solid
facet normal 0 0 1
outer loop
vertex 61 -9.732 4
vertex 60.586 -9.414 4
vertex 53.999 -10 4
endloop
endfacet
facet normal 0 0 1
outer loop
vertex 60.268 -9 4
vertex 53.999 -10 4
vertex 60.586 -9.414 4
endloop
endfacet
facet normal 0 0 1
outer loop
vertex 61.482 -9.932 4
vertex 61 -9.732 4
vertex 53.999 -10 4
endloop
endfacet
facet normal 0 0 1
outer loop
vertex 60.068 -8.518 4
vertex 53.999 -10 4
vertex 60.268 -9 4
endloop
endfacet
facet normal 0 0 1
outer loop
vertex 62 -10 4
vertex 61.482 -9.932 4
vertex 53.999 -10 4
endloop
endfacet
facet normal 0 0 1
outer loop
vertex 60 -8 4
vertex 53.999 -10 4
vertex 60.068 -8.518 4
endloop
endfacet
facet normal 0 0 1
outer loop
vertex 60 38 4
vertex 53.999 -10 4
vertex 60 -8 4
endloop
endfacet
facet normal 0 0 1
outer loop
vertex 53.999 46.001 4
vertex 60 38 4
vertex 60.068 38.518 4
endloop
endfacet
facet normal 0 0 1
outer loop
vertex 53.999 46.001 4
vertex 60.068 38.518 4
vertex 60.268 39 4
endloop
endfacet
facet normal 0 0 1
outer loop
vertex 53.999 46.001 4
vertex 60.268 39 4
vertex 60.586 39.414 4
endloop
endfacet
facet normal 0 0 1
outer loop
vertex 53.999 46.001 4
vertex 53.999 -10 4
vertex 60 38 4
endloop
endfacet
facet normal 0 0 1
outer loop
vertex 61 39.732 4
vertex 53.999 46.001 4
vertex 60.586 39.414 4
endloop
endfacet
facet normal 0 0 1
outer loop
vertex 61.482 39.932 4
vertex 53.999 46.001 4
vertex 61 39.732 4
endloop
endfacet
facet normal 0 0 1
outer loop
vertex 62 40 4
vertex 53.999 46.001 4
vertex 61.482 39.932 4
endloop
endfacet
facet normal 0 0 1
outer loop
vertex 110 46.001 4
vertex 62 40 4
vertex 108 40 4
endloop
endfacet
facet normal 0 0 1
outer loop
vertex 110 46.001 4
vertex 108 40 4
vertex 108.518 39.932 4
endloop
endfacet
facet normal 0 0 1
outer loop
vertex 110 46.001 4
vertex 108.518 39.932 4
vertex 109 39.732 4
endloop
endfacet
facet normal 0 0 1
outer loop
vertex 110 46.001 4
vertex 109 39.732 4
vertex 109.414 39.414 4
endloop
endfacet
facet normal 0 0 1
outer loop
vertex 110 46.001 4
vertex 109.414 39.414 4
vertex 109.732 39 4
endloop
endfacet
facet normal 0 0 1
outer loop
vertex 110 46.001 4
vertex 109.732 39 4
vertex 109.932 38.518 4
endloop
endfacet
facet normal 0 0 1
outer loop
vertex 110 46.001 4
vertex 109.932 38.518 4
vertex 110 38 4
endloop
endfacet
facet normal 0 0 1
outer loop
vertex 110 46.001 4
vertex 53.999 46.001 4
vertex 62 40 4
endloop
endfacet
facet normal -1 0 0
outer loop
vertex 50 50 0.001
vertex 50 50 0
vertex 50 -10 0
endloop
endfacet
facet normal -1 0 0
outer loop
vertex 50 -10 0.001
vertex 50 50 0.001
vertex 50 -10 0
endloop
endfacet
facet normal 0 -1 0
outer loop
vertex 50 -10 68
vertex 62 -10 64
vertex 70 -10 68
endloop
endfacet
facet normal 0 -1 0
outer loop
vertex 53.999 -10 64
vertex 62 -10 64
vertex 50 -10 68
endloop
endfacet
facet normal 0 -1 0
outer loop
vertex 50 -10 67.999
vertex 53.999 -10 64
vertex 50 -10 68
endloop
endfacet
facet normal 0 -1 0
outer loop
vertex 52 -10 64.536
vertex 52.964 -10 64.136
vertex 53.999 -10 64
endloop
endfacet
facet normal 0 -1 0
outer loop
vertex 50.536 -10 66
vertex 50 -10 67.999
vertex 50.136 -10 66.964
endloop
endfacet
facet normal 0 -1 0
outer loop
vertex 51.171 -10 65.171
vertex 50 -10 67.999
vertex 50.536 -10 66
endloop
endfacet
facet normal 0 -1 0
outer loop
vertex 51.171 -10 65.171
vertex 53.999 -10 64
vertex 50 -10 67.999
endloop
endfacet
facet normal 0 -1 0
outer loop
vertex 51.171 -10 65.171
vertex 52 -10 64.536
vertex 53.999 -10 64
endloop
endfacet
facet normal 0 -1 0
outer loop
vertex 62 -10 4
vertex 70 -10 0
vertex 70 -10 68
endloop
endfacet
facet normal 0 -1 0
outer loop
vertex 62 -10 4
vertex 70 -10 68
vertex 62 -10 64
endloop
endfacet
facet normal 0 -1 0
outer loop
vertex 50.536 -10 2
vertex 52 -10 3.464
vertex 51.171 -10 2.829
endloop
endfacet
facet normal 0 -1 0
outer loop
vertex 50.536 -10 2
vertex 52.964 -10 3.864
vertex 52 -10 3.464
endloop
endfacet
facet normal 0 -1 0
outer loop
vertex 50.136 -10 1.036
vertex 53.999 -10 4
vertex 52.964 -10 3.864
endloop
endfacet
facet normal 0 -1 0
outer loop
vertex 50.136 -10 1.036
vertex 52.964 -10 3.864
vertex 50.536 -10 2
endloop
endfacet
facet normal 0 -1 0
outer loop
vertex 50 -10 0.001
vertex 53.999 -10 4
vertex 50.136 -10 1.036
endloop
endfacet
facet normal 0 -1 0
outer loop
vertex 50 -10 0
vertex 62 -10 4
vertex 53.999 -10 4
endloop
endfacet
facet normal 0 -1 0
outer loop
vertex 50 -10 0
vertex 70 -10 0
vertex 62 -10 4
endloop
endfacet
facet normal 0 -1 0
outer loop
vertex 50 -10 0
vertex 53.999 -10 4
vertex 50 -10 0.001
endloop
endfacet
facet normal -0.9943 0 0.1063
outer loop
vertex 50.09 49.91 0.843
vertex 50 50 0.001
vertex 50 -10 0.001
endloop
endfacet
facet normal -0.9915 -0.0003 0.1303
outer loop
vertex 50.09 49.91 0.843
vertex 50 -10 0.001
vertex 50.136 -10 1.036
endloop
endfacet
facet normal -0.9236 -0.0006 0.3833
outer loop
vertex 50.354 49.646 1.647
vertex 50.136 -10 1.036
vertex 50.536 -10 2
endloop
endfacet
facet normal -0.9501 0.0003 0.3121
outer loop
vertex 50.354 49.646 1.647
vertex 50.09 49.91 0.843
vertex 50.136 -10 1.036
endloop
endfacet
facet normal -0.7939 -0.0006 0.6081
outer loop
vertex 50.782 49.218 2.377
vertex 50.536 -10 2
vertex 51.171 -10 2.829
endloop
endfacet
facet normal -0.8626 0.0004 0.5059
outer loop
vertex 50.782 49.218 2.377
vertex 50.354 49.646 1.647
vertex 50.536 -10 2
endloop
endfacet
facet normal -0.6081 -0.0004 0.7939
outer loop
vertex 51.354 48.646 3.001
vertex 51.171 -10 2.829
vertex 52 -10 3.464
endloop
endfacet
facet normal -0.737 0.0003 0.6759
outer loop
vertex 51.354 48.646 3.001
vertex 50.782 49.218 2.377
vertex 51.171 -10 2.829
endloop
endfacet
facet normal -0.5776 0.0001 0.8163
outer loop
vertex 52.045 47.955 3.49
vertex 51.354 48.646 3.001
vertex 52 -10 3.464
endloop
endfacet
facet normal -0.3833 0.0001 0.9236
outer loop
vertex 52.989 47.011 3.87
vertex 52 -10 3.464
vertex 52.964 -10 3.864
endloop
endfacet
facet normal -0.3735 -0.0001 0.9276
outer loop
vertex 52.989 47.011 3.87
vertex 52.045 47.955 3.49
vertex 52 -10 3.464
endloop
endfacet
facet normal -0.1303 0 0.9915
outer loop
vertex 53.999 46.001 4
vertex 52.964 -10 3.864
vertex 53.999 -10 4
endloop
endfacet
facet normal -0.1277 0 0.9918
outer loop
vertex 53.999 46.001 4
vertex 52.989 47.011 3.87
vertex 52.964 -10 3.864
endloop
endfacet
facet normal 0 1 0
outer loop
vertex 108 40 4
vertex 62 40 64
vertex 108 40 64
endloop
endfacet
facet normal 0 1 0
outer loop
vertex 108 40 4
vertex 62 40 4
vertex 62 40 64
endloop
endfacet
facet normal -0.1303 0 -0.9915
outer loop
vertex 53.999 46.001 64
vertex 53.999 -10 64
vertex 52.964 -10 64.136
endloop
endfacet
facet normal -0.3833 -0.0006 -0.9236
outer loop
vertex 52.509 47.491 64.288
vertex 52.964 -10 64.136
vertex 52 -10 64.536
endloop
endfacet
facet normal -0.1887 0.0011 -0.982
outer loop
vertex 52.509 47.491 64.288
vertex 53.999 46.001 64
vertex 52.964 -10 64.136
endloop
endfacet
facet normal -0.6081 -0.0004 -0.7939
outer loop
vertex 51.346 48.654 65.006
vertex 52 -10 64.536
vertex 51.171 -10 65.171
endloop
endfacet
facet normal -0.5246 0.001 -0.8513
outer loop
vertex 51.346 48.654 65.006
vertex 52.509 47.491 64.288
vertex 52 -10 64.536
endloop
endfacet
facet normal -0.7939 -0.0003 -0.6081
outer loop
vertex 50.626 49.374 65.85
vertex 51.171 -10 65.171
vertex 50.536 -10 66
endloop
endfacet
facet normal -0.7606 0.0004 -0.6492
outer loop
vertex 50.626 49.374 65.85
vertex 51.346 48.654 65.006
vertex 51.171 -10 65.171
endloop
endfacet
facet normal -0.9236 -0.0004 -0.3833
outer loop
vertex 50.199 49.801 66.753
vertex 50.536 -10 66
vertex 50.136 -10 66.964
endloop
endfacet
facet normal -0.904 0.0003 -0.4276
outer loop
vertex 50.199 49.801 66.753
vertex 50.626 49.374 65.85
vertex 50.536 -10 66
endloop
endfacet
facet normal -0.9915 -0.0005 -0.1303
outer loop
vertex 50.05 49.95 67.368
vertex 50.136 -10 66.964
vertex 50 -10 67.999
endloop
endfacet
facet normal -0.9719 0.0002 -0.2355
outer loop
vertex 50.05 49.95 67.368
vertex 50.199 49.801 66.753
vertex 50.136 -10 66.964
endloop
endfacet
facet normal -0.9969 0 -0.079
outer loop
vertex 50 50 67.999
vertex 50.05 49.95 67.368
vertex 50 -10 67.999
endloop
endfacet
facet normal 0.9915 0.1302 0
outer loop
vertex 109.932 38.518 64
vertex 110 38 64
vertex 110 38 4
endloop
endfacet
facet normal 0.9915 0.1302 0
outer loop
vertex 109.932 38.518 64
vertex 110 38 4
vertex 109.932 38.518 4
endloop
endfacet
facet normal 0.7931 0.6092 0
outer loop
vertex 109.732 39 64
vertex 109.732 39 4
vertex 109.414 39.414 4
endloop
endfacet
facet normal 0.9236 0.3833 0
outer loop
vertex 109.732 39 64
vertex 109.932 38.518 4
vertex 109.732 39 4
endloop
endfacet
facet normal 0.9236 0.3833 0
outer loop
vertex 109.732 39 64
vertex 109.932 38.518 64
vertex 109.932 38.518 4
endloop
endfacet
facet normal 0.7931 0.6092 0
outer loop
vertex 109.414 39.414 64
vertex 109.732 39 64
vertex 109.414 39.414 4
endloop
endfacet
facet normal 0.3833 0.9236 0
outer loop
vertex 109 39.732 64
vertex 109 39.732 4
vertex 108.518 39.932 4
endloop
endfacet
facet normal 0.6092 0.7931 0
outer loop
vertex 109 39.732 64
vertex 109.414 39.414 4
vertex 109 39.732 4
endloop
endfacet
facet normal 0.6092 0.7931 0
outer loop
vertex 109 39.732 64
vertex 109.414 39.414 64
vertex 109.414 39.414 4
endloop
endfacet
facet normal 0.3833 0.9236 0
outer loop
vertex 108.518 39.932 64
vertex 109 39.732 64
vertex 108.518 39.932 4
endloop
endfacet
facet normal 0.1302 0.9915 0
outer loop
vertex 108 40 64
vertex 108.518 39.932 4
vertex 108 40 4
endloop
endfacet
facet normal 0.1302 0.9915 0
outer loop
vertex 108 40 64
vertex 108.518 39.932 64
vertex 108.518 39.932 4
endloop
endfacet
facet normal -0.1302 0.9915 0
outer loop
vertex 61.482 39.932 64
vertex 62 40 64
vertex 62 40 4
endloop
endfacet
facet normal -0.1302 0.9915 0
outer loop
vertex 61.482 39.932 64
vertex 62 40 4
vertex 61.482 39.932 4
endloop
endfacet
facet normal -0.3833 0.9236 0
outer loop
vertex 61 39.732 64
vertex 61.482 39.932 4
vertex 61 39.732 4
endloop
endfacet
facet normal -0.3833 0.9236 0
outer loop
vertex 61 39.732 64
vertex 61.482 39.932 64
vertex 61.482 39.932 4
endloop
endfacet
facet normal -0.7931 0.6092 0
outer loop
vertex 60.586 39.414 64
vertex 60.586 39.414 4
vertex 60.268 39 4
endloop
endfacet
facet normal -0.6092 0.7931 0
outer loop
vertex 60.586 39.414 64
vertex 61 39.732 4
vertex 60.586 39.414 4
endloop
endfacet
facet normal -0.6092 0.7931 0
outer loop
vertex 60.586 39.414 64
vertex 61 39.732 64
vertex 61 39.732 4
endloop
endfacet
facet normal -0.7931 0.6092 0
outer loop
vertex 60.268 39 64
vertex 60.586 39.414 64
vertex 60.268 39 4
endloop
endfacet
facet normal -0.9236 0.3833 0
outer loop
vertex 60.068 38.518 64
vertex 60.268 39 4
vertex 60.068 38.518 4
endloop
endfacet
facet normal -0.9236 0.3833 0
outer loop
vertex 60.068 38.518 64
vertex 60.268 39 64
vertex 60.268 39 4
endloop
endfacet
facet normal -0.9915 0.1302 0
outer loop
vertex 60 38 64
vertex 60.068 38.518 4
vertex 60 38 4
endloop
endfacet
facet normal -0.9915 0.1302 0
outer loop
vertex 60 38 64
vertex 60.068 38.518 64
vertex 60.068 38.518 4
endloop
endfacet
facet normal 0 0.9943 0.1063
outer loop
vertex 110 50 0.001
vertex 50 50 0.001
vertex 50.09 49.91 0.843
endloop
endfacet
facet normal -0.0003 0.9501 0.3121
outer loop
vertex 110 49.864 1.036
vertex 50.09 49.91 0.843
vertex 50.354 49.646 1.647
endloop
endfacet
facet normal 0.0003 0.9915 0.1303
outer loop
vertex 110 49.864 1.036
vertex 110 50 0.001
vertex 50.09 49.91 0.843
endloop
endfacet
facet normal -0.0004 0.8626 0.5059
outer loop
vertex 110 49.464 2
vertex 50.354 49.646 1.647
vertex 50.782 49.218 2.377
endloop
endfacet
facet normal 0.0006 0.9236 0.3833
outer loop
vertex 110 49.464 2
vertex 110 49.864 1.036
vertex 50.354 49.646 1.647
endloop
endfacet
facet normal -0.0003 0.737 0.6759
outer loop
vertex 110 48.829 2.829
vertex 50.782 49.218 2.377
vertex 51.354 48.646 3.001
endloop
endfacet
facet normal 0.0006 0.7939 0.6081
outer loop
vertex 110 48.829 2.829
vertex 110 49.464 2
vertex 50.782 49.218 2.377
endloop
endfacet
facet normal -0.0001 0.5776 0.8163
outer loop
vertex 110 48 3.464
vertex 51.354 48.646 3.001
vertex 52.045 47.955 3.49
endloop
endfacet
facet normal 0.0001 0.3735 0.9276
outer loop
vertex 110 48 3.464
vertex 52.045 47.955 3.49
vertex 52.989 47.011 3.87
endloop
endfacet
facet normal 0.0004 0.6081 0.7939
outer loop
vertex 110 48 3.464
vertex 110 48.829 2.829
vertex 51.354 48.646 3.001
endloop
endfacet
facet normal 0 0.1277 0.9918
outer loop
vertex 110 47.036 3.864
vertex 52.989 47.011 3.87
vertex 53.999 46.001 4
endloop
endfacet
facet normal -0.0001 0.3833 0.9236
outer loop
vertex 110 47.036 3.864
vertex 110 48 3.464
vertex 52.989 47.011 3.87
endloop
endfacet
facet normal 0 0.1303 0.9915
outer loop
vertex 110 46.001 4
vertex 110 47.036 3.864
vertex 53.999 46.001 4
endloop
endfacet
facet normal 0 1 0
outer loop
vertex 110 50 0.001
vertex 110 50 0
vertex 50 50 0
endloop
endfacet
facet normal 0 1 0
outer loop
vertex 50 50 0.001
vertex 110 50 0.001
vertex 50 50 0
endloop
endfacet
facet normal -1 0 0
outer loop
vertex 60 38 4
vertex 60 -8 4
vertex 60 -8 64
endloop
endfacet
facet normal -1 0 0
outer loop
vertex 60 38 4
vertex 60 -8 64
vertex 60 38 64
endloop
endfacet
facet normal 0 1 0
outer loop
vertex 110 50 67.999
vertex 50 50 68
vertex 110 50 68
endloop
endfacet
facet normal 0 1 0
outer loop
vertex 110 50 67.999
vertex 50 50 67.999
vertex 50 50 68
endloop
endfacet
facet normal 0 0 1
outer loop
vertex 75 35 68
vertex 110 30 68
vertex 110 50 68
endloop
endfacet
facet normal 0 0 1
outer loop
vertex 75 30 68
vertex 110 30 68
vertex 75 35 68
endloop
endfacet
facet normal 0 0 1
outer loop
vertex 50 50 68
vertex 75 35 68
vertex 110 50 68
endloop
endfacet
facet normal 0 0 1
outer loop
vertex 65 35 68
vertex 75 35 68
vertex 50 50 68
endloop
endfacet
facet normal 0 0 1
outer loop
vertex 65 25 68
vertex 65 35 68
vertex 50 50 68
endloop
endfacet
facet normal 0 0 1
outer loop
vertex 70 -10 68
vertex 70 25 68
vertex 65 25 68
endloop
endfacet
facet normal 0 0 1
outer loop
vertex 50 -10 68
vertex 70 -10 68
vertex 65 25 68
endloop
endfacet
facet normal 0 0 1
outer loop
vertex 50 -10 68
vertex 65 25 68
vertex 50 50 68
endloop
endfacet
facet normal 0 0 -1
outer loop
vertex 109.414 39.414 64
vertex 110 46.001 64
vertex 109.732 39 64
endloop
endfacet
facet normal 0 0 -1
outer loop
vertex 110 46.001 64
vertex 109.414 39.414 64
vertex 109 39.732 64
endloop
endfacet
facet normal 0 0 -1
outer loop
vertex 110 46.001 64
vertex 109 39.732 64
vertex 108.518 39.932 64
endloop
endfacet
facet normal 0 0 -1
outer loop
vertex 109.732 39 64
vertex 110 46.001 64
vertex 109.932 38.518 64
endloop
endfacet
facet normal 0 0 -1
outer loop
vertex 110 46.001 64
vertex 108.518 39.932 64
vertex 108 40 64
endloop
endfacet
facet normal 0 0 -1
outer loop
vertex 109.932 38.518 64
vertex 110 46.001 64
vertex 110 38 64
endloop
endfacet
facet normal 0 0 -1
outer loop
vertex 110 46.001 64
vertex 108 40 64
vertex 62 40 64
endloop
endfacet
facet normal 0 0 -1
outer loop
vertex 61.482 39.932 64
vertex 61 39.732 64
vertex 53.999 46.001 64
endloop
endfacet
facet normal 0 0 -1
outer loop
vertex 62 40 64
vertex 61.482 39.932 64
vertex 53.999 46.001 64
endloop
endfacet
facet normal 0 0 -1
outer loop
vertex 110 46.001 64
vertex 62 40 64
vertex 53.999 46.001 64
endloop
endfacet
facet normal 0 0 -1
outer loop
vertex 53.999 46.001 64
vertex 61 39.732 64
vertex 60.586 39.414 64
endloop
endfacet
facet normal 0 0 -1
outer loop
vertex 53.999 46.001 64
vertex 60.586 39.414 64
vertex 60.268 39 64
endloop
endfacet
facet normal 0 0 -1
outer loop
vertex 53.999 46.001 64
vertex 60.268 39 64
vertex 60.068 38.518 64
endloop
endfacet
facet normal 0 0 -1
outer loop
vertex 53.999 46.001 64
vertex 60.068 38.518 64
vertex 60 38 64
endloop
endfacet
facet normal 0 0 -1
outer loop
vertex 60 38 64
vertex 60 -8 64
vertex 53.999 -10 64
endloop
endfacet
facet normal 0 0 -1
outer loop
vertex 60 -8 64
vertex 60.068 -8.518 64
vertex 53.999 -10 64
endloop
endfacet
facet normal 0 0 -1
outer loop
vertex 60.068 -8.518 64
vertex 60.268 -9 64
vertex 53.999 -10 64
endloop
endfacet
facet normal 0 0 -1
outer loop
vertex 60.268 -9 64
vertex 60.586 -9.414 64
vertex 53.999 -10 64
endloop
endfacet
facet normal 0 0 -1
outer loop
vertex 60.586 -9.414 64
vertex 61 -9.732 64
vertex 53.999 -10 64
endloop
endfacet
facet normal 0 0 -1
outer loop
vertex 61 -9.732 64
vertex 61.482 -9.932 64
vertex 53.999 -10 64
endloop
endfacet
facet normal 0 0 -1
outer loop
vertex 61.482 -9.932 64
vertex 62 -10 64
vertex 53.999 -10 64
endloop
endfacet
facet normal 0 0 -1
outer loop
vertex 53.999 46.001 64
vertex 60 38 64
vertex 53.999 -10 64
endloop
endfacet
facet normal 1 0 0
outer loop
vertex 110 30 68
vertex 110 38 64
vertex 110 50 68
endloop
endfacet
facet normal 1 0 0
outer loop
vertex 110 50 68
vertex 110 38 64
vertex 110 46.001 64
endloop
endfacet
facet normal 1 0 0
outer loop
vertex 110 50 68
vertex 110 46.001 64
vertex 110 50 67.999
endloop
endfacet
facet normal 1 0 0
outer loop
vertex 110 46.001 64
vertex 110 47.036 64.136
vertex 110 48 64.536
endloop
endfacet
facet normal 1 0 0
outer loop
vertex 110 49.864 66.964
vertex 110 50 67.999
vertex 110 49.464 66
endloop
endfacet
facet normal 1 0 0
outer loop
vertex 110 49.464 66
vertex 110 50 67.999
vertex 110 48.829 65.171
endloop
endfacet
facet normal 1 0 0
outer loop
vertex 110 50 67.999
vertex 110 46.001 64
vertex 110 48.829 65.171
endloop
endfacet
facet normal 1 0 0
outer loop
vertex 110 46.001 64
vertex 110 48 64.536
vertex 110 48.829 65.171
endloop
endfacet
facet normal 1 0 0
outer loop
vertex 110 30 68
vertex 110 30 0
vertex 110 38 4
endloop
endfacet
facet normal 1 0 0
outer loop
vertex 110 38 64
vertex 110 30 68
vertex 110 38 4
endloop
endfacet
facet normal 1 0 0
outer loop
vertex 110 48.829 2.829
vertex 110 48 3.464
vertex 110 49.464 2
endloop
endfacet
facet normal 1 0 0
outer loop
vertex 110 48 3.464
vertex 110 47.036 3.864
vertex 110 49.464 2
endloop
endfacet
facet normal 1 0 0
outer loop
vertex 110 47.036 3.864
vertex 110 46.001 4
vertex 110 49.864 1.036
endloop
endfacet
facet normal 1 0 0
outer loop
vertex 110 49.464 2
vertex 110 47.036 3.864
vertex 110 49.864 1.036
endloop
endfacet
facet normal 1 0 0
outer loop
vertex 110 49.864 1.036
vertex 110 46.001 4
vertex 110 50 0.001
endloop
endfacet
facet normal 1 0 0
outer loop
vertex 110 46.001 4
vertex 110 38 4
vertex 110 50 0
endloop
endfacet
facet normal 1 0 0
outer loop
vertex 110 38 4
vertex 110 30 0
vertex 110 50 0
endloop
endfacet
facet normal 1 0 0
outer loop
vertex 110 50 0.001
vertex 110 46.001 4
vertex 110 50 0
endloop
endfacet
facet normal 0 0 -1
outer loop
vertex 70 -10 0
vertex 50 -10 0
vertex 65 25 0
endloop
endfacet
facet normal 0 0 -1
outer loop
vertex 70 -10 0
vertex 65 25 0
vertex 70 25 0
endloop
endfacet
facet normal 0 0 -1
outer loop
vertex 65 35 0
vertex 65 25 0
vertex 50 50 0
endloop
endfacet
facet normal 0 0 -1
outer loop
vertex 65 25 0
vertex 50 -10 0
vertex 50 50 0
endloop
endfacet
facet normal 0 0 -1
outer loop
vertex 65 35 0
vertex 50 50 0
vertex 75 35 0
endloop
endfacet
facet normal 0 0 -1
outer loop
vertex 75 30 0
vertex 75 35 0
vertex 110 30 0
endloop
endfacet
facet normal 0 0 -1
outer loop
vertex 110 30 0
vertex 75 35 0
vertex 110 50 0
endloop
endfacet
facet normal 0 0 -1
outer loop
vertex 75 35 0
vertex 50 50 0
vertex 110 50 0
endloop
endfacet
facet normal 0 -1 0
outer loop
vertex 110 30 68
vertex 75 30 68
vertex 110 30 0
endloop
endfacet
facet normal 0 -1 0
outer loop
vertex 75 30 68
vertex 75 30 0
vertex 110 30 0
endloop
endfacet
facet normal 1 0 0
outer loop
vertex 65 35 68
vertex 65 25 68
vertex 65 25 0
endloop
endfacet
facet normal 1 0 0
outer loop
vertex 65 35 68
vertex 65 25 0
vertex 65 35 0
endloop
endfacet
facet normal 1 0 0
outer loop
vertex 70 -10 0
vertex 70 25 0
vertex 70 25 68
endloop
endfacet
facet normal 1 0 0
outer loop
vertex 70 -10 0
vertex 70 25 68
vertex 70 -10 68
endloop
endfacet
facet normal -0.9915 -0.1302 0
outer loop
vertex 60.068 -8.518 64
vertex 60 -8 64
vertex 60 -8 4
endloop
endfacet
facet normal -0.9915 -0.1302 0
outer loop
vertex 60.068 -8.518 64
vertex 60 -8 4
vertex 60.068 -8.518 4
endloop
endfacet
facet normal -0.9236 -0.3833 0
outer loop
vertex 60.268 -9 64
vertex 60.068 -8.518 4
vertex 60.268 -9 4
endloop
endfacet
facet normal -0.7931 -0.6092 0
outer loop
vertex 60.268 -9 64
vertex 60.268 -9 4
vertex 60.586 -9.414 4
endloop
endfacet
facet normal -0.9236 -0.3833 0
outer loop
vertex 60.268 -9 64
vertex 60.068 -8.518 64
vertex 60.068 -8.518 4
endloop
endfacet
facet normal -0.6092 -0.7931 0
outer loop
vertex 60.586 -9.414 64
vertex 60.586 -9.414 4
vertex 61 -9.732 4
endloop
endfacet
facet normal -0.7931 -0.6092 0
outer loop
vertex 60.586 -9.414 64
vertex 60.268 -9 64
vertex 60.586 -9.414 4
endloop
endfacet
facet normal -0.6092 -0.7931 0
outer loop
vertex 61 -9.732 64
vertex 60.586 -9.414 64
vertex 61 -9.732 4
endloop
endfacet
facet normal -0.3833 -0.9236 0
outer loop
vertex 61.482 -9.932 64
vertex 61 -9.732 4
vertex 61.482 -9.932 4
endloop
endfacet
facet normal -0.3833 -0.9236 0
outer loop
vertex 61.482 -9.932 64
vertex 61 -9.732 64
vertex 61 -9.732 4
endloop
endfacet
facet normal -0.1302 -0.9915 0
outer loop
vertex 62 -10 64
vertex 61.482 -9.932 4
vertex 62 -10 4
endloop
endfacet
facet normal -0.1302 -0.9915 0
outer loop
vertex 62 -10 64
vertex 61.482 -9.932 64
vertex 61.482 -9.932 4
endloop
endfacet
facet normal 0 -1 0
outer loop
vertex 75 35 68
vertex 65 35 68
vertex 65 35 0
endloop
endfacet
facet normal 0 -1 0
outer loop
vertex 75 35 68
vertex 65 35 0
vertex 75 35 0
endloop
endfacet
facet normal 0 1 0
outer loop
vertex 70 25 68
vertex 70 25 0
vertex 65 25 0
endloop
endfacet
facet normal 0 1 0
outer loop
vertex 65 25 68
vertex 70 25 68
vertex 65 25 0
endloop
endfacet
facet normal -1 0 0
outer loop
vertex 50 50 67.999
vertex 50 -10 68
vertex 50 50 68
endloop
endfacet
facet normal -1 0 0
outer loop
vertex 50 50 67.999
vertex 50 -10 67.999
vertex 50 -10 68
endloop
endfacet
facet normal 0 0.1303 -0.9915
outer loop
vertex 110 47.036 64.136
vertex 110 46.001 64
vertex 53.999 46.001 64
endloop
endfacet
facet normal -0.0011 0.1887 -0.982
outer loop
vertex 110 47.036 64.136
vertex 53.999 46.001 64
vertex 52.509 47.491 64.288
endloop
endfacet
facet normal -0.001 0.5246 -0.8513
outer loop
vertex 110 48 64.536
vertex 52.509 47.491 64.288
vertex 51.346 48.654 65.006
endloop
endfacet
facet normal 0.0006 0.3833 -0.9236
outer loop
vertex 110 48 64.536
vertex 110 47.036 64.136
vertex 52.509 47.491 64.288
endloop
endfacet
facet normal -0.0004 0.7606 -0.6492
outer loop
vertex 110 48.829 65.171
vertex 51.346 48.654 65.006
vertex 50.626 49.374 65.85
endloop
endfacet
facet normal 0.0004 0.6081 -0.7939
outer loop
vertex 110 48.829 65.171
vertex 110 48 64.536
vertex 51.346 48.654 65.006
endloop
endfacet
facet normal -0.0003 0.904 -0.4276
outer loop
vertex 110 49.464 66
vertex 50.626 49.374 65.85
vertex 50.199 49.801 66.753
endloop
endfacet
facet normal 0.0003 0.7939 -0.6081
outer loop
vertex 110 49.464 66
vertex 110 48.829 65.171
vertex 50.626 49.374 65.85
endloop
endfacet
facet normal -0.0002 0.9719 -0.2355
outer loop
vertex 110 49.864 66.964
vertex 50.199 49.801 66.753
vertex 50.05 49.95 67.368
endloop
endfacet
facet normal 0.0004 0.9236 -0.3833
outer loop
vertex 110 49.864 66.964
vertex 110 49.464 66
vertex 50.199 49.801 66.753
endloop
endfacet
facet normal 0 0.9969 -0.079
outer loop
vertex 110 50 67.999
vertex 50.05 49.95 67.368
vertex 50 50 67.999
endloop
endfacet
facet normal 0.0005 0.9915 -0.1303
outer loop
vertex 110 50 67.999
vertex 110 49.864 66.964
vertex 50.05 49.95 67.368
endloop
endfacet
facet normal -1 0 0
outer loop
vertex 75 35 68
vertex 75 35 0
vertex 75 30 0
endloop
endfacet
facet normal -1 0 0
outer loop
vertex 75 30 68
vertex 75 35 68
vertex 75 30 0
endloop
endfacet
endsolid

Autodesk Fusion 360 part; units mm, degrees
sketch "Sketch1" plane through (0, 0, 0) normal (0, 0, 1) x (1, 0, 0)
  line L0 (50, 30) -> (110, 30)
  line L1 (110, 30) -> (110, 50)
  line L2 (110, 50) -> (50, 50)
  line L3 (50, 50) -> (50, 30)
  line L4 (110, 30) -> (60, 30)
  line L5 (60, 30) -> (60, 40)
  line L6 (60, 40) -> (110, 40)
  line L7 (110, 40) -> (110, 30)
  line L8 (50, 50) -> (70, 50)
  line L9 (70, 50) -> (70, -10)
  line L10 (70, -10) -> (50, -10)
  line L11 (50, -10) -> (50, 50)
  line L12 (60, 40) -> (70, 40)
  line L13 (70, 40) -> (70, -10)
  line L14 (70, -10) -> (60, -10)
  line L15 (60, -10) -> (60, 40)
  dimension "d1" = 60
  dimension "d2" = 20
  dimension "d3" = 50
  dimension "d4" = 10
  dimension "d5" = 20
  dimension "d6" = 60
extrude "Extrude1" add sketch "Sketch1" along normal blind 4 contours L0 L2 L3 L5 L6 L8 L9 L11 L12 L15 | L0 L10 L11 L15 | L1 L2 L6 L9
extrude "Extrude2" add sketch "Sketch1" along normal blind 64 contours L0 L4 L5 L6 L9 L12 L13 L15 | L0 L4 L9 L10 L13 L14 L15 | L0 L1 L4 L6 L7 L9 L13
sketch "Sketch2" plane through (0, 0, 64) normal (0, 0, 1) x (-1, 0, 0)
  line L0 (-60, 10) -> (-70, 10)
  line L1 (-70, 10) -> (-70, -30)
  line L2 (-70, -30) -> (-110, -30)
  line L3 (-110, -30) -> (-110, -40)
  line L4 (-110, -40) -> (-60, -40)
  line L5 (-60, -40) -> (-60, 10)
  line L6 (-70, 10) -> (-50, 10)
  line L7 (-50, 10) -> (-50, -50)
  line L8 (-50, -50) -> (-70, -50)
  line L9 (-70, -50) -> (-70, 10)
  line L10 (-70, -30) -> (-110, -30)
  line L11 (-110, -30) -> (-110, -50)
  line L12 (-110, -50) -> (-70, -50)
  line L13 (-70, -50) -> (-70, -30)
extrude "Extrude3" add sketch "Sketch2" along normal blind 4
sketch "Sketch3" plane through (0, 0, 68) normal (0, 0, 1) x (-1, 0, 0)
  line L0 (-70, -30) -> (-110, -30)
  line L1 (-110, -30) -> (-110, -50)
  line L2 (-110, -50) -> (-50, -50)
  line L3 (-50, -50) -> (-50, 10)
  line L4 (-50, 10) -> (-70, 10)
  line L5 (-70, 10) -> (-70, -30)
  line L6 (-75, -25) -> (-65, -25)
  line L7 (-65, -25) -> (-65, -35)
  line L8 (-65, -35) -> (-75, -35)
  line L9 (-75, -35) -> (-75, -25)
extrude "Extrude4" cut sketch "Sketch3" against normal blind 68 contours L0 L5 L6 L7 L8 L9
fillet "Fillet1" radius 4 2 edges at (80, 50, 4) (50, 20, 4)
fillet "Fillet2" radius 4 2 edges at (80, 50, 64) (50, 20, 64)
fillet "Fillet3" radius 2 1 edges at (110, 40, 34)
fillet "Fillet4" radius 2 1 edges at (60, -10, 34)
fillet "Fillet5" radius 2 1 edges at (60, 40, 34)
